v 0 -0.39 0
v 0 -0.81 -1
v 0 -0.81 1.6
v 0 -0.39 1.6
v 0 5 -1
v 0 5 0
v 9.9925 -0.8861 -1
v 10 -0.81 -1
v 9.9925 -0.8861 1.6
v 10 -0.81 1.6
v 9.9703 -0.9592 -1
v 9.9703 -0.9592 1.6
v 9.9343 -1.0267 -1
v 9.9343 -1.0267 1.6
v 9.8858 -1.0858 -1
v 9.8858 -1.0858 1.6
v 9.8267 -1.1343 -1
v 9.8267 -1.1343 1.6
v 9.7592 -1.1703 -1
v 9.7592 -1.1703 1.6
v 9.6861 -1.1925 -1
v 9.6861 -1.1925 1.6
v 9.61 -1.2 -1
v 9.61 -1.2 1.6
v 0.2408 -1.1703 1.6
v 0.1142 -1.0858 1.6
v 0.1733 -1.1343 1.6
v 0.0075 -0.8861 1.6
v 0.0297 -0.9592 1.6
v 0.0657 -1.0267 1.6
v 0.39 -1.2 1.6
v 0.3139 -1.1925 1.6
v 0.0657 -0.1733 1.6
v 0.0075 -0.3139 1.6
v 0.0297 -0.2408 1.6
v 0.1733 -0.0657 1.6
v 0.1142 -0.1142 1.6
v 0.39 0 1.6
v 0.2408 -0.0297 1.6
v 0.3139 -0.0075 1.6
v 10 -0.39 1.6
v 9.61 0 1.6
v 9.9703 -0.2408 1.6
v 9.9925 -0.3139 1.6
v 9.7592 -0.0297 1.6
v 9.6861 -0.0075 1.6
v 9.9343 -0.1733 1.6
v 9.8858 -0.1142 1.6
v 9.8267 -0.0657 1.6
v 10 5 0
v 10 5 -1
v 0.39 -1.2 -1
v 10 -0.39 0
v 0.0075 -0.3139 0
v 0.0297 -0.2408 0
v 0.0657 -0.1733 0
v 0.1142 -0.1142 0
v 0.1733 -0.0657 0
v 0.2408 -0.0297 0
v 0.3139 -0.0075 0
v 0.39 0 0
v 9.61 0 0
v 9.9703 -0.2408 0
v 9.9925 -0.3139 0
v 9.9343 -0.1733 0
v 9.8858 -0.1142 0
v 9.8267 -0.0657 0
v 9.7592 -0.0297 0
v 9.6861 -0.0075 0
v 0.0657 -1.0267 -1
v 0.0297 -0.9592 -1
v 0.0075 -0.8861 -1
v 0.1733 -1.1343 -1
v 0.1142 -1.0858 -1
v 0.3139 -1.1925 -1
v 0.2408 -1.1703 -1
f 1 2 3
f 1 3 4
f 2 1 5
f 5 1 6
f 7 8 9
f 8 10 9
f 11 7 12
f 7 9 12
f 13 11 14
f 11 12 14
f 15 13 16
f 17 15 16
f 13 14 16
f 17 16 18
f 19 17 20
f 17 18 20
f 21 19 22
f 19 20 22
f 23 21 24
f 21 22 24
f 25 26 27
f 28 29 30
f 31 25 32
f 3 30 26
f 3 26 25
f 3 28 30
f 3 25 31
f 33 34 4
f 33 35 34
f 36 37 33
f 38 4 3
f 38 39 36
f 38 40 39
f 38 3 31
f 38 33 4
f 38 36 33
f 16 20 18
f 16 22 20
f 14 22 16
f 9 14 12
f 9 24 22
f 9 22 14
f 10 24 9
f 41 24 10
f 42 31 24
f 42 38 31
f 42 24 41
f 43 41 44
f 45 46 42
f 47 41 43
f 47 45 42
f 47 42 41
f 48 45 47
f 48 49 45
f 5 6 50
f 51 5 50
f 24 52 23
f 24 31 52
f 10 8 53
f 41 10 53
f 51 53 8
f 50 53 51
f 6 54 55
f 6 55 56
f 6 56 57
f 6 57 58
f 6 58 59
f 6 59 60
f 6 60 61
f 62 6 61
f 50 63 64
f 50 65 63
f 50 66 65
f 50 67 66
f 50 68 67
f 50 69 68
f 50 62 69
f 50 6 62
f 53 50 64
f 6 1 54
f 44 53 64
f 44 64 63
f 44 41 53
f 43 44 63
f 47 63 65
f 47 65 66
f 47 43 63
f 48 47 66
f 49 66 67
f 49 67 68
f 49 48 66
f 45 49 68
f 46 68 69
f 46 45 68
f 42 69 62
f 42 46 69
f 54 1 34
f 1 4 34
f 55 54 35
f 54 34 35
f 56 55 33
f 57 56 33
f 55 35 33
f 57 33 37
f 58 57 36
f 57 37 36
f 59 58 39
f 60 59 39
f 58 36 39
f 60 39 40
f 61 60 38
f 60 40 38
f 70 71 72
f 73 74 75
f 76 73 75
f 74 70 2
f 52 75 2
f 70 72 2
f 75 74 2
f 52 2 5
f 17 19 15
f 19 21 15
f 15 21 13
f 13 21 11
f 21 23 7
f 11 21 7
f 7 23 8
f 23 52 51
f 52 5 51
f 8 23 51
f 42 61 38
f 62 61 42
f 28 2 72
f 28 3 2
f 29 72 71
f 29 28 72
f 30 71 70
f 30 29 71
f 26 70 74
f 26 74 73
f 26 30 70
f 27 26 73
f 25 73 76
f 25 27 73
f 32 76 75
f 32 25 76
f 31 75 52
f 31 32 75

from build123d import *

# Parameters (mm, degrees)
SKETCH002_W  = 10
SKETCH002_H  = 1.2
PAD002_DEPTH = 1.6
SKETCH003_W  = 10
SKETCH003_H  = 6.2
PAD003_DEPTH = 1
FILLET001_R  = 0.39


with BuildPart() as part:
    # Sketch002 → Pad002 (new body)
    with BuildSketch(Plane.XY):
        with Locations((5, -0.6)):
            Rectangle(SKETCH002_W, SKETCH002_H)
    extrude(amount=PAD002_DEPTH)

    # Sketch003 → Pad003 (join)
    with BuildSketch(Plane.XY):
        with Locations((5, 1.9)):
            Rectangle(SKETCH003_W, SKETCH003_H)
    extrude(amount=-PAD003_DEPTH)

    # Fillet001
    fillet001_edges = [part.edges().sort_by_distance(p)[0] for p in [
        (0, -1.2, 0.3),
        (10, -1.2, 0.3),
        (10, 0, 0.8),
        (0, 0, 0.8),
    ]]
    fillet(fillet001_edges, radius=FILLET001_R)


solid = part.part
